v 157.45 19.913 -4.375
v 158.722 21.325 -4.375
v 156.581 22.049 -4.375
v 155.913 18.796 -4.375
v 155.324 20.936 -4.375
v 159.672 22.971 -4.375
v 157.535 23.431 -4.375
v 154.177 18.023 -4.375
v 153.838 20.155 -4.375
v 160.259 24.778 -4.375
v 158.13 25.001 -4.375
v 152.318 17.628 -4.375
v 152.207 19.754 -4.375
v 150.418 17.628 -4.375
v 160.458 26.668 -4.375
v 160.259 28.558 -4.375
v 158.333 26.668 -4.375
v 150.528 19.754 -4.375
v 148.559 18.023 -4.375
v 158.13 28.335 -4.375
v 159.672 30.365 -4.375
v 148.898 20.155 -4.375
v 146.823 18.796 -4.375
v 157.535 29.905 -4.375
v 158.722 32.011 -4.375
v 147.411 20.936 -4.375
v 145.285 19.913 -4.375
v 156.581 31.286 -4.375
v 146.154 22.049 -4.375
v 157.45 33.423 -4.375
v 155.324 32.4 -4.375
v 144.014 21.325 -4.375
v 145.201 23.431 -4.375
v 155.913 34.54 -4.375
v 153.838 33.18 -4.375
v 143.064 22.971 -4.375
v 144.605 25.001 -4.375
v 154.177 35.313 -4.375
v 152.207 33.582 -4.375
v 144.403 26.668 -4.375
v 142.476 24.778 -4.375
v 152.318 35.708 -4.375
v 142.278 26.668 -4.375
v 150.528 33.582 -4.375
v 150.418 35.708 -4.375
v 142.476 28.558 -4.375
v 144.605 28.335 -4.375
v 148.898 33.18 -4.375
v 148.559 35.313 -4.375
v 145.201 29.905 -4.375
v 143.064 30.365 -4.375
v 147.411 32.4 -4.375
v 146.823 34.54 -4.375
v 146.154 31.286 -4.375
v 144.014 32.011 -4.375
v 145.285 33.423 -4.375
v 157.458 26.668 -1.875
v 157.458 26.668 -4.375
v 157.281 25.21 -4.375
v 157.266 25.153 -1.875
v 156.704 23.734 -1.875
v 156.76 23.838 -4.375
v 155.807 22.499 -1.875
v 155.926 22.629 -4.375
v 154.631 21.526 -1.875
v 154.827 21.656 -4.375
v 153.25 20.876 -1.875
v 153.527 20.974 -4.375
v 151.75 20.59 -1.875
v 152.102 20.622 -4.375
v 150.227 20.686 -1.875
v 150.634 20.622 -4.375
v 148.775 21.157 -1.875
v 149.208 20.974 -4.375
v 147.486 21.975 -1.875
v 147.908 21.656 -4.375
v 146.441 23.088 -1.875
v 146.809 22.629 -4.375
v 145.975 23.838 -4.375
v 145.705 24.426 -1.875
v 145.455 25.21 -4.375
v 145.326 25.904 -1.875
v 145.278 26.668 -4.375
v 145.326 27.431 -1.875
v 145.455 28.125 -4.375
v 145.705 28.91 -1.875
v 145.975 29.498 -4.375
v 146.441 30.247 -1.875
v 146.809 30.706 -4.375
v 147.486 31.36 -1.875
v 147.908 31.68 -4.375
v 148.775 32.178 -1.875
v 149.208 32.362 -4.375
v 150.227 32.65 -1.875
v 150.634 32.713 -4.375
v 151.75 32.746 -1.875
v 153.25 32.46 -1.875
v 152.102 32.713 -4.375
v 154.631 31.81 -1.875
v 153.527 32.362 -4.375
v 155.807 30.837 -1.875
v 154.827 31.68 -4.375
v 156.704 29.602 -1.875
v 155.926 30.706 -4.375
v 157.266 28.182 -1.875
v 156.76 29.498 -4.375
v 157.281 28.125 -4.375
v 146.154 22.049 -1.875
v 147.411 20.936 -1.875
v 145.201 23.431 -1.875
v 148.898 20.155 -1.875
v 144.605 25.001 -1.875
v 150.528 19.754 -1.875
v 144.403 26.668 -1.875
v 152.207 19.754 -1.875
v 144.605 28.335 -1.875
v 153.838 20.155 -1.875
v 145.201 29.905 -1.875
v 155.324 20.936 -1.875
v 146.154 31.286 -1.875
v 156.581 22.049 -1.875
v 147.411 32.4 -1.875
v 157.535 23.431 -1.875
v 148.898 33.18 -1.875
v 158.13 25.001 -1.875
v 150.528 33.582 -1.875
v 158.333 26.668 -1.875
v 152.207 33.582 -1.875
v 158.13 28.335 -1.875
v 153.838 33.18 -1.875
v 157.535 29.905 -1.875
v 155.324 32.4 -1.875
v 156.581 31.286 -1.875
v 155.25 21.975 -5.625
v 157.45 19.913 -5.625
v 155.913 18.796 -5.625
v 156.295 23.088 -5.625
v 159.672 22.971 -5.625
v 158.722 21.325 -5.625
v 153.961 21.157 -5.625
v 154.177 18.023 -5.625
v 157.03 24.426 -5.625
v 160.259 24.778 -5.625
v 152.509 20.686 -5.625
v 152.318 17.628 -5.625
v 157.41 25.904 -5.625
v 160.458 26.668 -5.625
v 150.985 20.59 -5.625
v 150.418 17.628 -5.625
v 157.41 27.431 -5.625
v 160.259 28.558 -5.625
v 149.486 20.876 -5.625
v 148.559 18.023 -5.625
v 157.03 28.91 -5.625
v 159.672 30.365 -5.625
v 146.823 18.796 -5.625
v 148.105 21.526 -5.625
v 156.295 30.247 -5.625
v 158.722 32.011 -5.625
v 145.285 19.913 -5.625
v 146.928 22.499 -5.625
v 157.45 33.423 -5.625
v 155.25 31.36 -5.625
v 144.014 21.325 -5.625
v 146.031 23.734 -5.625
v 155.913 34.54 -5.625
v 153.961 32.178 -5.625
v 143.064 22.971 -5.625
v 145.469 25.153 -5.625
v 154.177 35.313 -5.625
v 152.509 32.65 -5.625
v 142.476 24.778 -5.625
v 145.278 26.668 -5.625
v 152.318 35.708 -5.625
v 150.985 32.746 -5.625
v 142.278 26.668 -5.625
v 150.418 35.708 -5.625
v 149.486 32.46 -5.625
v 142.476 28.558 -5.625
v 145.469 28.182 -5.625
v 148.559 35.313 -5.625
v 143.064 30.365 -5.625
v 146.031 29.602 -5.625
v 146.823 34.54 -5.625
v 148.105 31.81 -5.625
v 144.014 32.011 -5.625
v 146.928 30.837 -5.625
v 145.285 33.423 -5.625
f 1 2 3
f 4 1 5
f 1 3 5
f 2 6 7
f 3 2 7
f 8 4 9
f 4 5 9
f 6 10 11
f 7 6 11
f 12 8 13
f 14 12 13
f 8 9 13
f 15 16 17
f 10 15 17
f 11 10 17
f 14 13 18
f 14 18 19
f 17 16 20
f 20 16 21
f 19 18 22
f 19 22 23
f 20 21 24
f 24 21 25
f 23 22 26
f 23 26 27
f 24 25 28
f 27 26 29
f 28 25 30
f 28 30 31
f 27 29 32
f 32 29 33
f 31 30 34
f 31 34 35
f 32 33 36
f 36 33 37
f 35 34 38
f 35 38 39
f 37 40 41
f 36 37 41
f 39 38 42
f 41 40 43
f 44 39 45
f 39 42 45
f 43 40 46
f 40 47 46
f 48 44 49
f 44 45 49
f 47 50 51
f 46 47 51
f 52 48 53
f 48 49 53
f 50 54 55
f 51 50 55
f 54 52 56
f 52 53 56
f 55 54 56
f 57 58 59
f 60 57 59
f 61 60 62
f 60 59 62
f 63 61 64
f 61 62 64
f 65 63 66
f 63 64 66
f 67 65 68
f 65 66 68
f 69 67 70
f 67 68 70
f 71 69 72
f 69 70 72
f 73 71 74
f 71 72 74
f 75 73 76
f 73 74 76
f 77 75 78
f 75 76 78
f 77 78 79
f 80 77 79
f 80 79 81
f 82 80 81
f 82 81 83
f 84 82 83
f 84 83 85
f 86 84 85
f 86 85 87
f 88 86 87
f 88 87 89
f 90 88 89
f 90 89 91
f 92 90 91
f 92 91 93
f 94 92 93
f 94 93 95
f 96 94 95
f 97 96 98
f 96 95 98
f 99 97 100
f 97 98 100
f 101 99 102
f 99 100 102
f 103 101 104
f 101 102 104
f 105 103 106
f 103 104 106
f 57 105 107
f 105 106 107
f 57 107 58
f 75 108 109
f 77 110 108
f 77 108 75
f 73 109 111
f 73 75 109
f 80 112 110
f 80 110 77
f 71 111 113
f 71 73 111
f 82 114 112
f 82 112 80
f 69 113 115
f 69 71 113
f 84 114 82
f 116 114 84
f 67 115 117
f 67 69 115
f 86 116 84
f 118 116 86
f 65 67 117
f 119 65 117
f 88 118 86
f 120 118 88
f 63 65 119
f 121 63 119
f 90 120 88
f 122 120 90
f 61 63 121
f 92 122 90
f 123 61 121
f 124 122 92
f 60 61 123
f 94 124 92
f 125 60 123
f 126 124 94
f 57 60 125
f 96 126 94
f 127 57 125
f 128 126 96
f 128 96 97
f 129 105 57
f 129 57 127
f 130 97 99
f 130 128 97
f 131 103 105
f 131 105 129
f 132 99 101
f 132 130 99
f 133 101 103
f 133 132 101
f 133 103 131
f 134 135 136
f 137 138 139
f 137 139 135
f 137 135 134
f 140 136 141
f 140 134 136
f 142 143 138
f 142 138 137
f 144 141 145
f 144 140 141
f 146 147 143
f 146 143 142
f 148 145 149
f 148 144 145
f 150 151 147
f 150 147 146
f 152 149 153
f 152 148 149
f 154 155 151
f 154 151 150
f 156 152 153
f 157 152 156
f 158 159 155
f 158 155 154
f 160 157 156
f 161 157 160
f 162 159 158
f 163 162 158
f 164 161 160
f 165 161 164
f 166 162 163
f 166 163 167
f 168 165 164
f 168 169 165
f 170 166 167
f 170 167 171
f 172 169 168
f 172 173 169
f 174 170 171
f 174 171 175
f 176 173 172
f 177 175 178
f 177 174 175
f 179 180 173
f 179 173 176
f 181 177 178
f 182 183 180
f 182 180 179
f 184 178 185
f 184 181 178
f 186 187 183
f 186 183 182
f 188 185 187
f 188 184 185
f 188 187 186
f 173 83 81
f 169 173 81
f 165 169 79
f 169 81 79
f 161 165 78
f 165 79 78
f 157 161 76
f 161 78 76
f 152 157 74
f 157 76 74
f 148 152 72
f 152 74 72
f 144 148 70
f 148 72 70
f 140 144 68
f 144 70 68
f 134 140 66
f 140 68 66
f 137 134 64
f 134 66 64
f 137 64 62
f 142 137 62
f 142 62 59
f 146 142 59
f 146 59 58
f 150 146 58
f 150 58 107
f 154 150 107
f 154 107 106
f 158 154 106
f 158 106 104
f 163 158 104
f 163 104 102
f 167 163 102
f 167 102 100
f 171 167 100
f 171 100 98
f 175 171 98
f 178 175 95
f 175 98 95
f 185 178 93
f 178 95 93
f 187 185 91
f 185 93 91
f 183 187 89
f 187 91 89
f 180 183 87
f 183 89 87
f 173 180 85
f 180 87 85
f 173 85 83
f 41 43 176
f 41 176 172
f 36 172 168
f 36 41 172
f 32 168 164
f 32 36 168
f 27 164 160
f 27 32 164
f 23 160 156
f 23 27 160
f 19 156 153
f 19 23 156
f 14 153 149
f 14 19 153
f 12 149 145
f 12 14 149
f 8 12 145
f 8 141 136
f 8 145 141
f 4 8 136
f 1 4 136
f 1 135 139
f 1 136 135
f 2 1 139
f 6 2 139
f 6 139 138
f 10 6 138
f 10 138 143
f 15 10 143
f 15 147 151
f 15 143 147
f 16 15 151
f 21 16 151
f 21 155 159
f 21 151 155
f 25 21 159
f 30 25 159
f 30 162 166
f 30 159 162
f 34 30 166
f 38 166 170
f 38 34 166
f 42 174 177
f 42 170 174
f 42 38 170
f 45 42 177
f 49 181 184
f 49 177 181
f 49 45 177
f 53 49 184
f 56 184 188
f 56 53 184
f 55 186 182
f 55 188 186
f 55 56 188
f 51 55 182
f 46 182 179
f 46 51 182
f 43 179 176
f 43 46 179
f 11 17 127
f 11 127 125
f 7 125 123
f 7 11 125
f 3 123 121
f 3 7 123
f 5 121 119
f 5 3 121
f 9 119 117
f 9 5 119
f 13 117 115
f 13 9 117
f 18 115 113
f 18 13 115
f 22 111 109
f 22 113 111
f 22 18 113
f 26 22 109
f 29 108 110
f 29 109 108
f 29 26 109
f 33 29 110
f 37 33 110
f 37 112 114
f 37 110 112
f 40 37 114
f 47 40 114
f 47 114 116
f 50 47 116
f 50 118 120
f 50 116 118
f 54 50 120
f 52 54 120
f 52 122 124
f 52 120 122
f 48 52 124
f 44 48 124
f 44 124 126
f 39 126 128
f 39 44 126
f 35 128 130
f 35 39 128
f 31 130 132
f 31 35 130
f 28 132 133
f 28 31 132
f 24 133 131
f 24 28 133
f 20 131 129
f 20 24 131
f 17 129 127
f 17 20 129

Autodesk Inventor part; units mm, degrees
ref_plane "YZ Plane" through (0, 0, 0) normal (1, 0, 0) x (0, 1, 0)
ref_plane "XZ Plane" through (0, 0, 0) normal (0, 1, 0) x (-1, 0, 0)
sketch "Sketch1" plane through (0, 0, 0) normal (0, 0, 1) x (1, 0, 0)
  circle A0 centre (151.367767, 26.667767) radius 7
  circle A1 centre (151.367767, 26.667767) radius 6.965
  circle A2 centre (151.367767, 26.667767) radius 6.09
  point P0 (0, 0)
  dimension "d0" = 0.035
  dimension "d2" = 0.875
ref_plane "Work Plane1" through (-19.467767, 1.0375, -4.375) normal (0, 0, -1) x (0, 1, 0)
sketch "Sketch1 outline for Extrusion1" plane through (0, 0, 0) normal (0, 0, 1) x (1, 0, 0)
  circle A0 centre (151.367767, 26.667767) radius 6.965
  circle A1 centre (151.367767, 26.667767) radius 6.09
extrude "Extrusion1" add sketch "Sketch1 outline for Extrusion1" along normal blind 2.5 from surface at -4.375
sketch "Sketch2" plane through (151.367767, 26.667767, -4.375) normal (0, 0, -1) x (-1, 0, 0)
  circle A0 centre (0, 0) radius 6.965 projected
  circle A1 centre (0, 0) radius 6.09 projected
  circle A2 centre (0, 0) radius 7.09
  circle A3 centre (0, 0) radius 9.09
  point P0 (151.367767, -26.667767)
  dimension "d5" = 0.125
  dimension "d6" = 2
extrude "Extrusion2" add sketch "Sketch2" along normal blind 1.25 contours A0 | A2 | A3
properties part number "Half Inch Lense Holder Cover (V5)"
